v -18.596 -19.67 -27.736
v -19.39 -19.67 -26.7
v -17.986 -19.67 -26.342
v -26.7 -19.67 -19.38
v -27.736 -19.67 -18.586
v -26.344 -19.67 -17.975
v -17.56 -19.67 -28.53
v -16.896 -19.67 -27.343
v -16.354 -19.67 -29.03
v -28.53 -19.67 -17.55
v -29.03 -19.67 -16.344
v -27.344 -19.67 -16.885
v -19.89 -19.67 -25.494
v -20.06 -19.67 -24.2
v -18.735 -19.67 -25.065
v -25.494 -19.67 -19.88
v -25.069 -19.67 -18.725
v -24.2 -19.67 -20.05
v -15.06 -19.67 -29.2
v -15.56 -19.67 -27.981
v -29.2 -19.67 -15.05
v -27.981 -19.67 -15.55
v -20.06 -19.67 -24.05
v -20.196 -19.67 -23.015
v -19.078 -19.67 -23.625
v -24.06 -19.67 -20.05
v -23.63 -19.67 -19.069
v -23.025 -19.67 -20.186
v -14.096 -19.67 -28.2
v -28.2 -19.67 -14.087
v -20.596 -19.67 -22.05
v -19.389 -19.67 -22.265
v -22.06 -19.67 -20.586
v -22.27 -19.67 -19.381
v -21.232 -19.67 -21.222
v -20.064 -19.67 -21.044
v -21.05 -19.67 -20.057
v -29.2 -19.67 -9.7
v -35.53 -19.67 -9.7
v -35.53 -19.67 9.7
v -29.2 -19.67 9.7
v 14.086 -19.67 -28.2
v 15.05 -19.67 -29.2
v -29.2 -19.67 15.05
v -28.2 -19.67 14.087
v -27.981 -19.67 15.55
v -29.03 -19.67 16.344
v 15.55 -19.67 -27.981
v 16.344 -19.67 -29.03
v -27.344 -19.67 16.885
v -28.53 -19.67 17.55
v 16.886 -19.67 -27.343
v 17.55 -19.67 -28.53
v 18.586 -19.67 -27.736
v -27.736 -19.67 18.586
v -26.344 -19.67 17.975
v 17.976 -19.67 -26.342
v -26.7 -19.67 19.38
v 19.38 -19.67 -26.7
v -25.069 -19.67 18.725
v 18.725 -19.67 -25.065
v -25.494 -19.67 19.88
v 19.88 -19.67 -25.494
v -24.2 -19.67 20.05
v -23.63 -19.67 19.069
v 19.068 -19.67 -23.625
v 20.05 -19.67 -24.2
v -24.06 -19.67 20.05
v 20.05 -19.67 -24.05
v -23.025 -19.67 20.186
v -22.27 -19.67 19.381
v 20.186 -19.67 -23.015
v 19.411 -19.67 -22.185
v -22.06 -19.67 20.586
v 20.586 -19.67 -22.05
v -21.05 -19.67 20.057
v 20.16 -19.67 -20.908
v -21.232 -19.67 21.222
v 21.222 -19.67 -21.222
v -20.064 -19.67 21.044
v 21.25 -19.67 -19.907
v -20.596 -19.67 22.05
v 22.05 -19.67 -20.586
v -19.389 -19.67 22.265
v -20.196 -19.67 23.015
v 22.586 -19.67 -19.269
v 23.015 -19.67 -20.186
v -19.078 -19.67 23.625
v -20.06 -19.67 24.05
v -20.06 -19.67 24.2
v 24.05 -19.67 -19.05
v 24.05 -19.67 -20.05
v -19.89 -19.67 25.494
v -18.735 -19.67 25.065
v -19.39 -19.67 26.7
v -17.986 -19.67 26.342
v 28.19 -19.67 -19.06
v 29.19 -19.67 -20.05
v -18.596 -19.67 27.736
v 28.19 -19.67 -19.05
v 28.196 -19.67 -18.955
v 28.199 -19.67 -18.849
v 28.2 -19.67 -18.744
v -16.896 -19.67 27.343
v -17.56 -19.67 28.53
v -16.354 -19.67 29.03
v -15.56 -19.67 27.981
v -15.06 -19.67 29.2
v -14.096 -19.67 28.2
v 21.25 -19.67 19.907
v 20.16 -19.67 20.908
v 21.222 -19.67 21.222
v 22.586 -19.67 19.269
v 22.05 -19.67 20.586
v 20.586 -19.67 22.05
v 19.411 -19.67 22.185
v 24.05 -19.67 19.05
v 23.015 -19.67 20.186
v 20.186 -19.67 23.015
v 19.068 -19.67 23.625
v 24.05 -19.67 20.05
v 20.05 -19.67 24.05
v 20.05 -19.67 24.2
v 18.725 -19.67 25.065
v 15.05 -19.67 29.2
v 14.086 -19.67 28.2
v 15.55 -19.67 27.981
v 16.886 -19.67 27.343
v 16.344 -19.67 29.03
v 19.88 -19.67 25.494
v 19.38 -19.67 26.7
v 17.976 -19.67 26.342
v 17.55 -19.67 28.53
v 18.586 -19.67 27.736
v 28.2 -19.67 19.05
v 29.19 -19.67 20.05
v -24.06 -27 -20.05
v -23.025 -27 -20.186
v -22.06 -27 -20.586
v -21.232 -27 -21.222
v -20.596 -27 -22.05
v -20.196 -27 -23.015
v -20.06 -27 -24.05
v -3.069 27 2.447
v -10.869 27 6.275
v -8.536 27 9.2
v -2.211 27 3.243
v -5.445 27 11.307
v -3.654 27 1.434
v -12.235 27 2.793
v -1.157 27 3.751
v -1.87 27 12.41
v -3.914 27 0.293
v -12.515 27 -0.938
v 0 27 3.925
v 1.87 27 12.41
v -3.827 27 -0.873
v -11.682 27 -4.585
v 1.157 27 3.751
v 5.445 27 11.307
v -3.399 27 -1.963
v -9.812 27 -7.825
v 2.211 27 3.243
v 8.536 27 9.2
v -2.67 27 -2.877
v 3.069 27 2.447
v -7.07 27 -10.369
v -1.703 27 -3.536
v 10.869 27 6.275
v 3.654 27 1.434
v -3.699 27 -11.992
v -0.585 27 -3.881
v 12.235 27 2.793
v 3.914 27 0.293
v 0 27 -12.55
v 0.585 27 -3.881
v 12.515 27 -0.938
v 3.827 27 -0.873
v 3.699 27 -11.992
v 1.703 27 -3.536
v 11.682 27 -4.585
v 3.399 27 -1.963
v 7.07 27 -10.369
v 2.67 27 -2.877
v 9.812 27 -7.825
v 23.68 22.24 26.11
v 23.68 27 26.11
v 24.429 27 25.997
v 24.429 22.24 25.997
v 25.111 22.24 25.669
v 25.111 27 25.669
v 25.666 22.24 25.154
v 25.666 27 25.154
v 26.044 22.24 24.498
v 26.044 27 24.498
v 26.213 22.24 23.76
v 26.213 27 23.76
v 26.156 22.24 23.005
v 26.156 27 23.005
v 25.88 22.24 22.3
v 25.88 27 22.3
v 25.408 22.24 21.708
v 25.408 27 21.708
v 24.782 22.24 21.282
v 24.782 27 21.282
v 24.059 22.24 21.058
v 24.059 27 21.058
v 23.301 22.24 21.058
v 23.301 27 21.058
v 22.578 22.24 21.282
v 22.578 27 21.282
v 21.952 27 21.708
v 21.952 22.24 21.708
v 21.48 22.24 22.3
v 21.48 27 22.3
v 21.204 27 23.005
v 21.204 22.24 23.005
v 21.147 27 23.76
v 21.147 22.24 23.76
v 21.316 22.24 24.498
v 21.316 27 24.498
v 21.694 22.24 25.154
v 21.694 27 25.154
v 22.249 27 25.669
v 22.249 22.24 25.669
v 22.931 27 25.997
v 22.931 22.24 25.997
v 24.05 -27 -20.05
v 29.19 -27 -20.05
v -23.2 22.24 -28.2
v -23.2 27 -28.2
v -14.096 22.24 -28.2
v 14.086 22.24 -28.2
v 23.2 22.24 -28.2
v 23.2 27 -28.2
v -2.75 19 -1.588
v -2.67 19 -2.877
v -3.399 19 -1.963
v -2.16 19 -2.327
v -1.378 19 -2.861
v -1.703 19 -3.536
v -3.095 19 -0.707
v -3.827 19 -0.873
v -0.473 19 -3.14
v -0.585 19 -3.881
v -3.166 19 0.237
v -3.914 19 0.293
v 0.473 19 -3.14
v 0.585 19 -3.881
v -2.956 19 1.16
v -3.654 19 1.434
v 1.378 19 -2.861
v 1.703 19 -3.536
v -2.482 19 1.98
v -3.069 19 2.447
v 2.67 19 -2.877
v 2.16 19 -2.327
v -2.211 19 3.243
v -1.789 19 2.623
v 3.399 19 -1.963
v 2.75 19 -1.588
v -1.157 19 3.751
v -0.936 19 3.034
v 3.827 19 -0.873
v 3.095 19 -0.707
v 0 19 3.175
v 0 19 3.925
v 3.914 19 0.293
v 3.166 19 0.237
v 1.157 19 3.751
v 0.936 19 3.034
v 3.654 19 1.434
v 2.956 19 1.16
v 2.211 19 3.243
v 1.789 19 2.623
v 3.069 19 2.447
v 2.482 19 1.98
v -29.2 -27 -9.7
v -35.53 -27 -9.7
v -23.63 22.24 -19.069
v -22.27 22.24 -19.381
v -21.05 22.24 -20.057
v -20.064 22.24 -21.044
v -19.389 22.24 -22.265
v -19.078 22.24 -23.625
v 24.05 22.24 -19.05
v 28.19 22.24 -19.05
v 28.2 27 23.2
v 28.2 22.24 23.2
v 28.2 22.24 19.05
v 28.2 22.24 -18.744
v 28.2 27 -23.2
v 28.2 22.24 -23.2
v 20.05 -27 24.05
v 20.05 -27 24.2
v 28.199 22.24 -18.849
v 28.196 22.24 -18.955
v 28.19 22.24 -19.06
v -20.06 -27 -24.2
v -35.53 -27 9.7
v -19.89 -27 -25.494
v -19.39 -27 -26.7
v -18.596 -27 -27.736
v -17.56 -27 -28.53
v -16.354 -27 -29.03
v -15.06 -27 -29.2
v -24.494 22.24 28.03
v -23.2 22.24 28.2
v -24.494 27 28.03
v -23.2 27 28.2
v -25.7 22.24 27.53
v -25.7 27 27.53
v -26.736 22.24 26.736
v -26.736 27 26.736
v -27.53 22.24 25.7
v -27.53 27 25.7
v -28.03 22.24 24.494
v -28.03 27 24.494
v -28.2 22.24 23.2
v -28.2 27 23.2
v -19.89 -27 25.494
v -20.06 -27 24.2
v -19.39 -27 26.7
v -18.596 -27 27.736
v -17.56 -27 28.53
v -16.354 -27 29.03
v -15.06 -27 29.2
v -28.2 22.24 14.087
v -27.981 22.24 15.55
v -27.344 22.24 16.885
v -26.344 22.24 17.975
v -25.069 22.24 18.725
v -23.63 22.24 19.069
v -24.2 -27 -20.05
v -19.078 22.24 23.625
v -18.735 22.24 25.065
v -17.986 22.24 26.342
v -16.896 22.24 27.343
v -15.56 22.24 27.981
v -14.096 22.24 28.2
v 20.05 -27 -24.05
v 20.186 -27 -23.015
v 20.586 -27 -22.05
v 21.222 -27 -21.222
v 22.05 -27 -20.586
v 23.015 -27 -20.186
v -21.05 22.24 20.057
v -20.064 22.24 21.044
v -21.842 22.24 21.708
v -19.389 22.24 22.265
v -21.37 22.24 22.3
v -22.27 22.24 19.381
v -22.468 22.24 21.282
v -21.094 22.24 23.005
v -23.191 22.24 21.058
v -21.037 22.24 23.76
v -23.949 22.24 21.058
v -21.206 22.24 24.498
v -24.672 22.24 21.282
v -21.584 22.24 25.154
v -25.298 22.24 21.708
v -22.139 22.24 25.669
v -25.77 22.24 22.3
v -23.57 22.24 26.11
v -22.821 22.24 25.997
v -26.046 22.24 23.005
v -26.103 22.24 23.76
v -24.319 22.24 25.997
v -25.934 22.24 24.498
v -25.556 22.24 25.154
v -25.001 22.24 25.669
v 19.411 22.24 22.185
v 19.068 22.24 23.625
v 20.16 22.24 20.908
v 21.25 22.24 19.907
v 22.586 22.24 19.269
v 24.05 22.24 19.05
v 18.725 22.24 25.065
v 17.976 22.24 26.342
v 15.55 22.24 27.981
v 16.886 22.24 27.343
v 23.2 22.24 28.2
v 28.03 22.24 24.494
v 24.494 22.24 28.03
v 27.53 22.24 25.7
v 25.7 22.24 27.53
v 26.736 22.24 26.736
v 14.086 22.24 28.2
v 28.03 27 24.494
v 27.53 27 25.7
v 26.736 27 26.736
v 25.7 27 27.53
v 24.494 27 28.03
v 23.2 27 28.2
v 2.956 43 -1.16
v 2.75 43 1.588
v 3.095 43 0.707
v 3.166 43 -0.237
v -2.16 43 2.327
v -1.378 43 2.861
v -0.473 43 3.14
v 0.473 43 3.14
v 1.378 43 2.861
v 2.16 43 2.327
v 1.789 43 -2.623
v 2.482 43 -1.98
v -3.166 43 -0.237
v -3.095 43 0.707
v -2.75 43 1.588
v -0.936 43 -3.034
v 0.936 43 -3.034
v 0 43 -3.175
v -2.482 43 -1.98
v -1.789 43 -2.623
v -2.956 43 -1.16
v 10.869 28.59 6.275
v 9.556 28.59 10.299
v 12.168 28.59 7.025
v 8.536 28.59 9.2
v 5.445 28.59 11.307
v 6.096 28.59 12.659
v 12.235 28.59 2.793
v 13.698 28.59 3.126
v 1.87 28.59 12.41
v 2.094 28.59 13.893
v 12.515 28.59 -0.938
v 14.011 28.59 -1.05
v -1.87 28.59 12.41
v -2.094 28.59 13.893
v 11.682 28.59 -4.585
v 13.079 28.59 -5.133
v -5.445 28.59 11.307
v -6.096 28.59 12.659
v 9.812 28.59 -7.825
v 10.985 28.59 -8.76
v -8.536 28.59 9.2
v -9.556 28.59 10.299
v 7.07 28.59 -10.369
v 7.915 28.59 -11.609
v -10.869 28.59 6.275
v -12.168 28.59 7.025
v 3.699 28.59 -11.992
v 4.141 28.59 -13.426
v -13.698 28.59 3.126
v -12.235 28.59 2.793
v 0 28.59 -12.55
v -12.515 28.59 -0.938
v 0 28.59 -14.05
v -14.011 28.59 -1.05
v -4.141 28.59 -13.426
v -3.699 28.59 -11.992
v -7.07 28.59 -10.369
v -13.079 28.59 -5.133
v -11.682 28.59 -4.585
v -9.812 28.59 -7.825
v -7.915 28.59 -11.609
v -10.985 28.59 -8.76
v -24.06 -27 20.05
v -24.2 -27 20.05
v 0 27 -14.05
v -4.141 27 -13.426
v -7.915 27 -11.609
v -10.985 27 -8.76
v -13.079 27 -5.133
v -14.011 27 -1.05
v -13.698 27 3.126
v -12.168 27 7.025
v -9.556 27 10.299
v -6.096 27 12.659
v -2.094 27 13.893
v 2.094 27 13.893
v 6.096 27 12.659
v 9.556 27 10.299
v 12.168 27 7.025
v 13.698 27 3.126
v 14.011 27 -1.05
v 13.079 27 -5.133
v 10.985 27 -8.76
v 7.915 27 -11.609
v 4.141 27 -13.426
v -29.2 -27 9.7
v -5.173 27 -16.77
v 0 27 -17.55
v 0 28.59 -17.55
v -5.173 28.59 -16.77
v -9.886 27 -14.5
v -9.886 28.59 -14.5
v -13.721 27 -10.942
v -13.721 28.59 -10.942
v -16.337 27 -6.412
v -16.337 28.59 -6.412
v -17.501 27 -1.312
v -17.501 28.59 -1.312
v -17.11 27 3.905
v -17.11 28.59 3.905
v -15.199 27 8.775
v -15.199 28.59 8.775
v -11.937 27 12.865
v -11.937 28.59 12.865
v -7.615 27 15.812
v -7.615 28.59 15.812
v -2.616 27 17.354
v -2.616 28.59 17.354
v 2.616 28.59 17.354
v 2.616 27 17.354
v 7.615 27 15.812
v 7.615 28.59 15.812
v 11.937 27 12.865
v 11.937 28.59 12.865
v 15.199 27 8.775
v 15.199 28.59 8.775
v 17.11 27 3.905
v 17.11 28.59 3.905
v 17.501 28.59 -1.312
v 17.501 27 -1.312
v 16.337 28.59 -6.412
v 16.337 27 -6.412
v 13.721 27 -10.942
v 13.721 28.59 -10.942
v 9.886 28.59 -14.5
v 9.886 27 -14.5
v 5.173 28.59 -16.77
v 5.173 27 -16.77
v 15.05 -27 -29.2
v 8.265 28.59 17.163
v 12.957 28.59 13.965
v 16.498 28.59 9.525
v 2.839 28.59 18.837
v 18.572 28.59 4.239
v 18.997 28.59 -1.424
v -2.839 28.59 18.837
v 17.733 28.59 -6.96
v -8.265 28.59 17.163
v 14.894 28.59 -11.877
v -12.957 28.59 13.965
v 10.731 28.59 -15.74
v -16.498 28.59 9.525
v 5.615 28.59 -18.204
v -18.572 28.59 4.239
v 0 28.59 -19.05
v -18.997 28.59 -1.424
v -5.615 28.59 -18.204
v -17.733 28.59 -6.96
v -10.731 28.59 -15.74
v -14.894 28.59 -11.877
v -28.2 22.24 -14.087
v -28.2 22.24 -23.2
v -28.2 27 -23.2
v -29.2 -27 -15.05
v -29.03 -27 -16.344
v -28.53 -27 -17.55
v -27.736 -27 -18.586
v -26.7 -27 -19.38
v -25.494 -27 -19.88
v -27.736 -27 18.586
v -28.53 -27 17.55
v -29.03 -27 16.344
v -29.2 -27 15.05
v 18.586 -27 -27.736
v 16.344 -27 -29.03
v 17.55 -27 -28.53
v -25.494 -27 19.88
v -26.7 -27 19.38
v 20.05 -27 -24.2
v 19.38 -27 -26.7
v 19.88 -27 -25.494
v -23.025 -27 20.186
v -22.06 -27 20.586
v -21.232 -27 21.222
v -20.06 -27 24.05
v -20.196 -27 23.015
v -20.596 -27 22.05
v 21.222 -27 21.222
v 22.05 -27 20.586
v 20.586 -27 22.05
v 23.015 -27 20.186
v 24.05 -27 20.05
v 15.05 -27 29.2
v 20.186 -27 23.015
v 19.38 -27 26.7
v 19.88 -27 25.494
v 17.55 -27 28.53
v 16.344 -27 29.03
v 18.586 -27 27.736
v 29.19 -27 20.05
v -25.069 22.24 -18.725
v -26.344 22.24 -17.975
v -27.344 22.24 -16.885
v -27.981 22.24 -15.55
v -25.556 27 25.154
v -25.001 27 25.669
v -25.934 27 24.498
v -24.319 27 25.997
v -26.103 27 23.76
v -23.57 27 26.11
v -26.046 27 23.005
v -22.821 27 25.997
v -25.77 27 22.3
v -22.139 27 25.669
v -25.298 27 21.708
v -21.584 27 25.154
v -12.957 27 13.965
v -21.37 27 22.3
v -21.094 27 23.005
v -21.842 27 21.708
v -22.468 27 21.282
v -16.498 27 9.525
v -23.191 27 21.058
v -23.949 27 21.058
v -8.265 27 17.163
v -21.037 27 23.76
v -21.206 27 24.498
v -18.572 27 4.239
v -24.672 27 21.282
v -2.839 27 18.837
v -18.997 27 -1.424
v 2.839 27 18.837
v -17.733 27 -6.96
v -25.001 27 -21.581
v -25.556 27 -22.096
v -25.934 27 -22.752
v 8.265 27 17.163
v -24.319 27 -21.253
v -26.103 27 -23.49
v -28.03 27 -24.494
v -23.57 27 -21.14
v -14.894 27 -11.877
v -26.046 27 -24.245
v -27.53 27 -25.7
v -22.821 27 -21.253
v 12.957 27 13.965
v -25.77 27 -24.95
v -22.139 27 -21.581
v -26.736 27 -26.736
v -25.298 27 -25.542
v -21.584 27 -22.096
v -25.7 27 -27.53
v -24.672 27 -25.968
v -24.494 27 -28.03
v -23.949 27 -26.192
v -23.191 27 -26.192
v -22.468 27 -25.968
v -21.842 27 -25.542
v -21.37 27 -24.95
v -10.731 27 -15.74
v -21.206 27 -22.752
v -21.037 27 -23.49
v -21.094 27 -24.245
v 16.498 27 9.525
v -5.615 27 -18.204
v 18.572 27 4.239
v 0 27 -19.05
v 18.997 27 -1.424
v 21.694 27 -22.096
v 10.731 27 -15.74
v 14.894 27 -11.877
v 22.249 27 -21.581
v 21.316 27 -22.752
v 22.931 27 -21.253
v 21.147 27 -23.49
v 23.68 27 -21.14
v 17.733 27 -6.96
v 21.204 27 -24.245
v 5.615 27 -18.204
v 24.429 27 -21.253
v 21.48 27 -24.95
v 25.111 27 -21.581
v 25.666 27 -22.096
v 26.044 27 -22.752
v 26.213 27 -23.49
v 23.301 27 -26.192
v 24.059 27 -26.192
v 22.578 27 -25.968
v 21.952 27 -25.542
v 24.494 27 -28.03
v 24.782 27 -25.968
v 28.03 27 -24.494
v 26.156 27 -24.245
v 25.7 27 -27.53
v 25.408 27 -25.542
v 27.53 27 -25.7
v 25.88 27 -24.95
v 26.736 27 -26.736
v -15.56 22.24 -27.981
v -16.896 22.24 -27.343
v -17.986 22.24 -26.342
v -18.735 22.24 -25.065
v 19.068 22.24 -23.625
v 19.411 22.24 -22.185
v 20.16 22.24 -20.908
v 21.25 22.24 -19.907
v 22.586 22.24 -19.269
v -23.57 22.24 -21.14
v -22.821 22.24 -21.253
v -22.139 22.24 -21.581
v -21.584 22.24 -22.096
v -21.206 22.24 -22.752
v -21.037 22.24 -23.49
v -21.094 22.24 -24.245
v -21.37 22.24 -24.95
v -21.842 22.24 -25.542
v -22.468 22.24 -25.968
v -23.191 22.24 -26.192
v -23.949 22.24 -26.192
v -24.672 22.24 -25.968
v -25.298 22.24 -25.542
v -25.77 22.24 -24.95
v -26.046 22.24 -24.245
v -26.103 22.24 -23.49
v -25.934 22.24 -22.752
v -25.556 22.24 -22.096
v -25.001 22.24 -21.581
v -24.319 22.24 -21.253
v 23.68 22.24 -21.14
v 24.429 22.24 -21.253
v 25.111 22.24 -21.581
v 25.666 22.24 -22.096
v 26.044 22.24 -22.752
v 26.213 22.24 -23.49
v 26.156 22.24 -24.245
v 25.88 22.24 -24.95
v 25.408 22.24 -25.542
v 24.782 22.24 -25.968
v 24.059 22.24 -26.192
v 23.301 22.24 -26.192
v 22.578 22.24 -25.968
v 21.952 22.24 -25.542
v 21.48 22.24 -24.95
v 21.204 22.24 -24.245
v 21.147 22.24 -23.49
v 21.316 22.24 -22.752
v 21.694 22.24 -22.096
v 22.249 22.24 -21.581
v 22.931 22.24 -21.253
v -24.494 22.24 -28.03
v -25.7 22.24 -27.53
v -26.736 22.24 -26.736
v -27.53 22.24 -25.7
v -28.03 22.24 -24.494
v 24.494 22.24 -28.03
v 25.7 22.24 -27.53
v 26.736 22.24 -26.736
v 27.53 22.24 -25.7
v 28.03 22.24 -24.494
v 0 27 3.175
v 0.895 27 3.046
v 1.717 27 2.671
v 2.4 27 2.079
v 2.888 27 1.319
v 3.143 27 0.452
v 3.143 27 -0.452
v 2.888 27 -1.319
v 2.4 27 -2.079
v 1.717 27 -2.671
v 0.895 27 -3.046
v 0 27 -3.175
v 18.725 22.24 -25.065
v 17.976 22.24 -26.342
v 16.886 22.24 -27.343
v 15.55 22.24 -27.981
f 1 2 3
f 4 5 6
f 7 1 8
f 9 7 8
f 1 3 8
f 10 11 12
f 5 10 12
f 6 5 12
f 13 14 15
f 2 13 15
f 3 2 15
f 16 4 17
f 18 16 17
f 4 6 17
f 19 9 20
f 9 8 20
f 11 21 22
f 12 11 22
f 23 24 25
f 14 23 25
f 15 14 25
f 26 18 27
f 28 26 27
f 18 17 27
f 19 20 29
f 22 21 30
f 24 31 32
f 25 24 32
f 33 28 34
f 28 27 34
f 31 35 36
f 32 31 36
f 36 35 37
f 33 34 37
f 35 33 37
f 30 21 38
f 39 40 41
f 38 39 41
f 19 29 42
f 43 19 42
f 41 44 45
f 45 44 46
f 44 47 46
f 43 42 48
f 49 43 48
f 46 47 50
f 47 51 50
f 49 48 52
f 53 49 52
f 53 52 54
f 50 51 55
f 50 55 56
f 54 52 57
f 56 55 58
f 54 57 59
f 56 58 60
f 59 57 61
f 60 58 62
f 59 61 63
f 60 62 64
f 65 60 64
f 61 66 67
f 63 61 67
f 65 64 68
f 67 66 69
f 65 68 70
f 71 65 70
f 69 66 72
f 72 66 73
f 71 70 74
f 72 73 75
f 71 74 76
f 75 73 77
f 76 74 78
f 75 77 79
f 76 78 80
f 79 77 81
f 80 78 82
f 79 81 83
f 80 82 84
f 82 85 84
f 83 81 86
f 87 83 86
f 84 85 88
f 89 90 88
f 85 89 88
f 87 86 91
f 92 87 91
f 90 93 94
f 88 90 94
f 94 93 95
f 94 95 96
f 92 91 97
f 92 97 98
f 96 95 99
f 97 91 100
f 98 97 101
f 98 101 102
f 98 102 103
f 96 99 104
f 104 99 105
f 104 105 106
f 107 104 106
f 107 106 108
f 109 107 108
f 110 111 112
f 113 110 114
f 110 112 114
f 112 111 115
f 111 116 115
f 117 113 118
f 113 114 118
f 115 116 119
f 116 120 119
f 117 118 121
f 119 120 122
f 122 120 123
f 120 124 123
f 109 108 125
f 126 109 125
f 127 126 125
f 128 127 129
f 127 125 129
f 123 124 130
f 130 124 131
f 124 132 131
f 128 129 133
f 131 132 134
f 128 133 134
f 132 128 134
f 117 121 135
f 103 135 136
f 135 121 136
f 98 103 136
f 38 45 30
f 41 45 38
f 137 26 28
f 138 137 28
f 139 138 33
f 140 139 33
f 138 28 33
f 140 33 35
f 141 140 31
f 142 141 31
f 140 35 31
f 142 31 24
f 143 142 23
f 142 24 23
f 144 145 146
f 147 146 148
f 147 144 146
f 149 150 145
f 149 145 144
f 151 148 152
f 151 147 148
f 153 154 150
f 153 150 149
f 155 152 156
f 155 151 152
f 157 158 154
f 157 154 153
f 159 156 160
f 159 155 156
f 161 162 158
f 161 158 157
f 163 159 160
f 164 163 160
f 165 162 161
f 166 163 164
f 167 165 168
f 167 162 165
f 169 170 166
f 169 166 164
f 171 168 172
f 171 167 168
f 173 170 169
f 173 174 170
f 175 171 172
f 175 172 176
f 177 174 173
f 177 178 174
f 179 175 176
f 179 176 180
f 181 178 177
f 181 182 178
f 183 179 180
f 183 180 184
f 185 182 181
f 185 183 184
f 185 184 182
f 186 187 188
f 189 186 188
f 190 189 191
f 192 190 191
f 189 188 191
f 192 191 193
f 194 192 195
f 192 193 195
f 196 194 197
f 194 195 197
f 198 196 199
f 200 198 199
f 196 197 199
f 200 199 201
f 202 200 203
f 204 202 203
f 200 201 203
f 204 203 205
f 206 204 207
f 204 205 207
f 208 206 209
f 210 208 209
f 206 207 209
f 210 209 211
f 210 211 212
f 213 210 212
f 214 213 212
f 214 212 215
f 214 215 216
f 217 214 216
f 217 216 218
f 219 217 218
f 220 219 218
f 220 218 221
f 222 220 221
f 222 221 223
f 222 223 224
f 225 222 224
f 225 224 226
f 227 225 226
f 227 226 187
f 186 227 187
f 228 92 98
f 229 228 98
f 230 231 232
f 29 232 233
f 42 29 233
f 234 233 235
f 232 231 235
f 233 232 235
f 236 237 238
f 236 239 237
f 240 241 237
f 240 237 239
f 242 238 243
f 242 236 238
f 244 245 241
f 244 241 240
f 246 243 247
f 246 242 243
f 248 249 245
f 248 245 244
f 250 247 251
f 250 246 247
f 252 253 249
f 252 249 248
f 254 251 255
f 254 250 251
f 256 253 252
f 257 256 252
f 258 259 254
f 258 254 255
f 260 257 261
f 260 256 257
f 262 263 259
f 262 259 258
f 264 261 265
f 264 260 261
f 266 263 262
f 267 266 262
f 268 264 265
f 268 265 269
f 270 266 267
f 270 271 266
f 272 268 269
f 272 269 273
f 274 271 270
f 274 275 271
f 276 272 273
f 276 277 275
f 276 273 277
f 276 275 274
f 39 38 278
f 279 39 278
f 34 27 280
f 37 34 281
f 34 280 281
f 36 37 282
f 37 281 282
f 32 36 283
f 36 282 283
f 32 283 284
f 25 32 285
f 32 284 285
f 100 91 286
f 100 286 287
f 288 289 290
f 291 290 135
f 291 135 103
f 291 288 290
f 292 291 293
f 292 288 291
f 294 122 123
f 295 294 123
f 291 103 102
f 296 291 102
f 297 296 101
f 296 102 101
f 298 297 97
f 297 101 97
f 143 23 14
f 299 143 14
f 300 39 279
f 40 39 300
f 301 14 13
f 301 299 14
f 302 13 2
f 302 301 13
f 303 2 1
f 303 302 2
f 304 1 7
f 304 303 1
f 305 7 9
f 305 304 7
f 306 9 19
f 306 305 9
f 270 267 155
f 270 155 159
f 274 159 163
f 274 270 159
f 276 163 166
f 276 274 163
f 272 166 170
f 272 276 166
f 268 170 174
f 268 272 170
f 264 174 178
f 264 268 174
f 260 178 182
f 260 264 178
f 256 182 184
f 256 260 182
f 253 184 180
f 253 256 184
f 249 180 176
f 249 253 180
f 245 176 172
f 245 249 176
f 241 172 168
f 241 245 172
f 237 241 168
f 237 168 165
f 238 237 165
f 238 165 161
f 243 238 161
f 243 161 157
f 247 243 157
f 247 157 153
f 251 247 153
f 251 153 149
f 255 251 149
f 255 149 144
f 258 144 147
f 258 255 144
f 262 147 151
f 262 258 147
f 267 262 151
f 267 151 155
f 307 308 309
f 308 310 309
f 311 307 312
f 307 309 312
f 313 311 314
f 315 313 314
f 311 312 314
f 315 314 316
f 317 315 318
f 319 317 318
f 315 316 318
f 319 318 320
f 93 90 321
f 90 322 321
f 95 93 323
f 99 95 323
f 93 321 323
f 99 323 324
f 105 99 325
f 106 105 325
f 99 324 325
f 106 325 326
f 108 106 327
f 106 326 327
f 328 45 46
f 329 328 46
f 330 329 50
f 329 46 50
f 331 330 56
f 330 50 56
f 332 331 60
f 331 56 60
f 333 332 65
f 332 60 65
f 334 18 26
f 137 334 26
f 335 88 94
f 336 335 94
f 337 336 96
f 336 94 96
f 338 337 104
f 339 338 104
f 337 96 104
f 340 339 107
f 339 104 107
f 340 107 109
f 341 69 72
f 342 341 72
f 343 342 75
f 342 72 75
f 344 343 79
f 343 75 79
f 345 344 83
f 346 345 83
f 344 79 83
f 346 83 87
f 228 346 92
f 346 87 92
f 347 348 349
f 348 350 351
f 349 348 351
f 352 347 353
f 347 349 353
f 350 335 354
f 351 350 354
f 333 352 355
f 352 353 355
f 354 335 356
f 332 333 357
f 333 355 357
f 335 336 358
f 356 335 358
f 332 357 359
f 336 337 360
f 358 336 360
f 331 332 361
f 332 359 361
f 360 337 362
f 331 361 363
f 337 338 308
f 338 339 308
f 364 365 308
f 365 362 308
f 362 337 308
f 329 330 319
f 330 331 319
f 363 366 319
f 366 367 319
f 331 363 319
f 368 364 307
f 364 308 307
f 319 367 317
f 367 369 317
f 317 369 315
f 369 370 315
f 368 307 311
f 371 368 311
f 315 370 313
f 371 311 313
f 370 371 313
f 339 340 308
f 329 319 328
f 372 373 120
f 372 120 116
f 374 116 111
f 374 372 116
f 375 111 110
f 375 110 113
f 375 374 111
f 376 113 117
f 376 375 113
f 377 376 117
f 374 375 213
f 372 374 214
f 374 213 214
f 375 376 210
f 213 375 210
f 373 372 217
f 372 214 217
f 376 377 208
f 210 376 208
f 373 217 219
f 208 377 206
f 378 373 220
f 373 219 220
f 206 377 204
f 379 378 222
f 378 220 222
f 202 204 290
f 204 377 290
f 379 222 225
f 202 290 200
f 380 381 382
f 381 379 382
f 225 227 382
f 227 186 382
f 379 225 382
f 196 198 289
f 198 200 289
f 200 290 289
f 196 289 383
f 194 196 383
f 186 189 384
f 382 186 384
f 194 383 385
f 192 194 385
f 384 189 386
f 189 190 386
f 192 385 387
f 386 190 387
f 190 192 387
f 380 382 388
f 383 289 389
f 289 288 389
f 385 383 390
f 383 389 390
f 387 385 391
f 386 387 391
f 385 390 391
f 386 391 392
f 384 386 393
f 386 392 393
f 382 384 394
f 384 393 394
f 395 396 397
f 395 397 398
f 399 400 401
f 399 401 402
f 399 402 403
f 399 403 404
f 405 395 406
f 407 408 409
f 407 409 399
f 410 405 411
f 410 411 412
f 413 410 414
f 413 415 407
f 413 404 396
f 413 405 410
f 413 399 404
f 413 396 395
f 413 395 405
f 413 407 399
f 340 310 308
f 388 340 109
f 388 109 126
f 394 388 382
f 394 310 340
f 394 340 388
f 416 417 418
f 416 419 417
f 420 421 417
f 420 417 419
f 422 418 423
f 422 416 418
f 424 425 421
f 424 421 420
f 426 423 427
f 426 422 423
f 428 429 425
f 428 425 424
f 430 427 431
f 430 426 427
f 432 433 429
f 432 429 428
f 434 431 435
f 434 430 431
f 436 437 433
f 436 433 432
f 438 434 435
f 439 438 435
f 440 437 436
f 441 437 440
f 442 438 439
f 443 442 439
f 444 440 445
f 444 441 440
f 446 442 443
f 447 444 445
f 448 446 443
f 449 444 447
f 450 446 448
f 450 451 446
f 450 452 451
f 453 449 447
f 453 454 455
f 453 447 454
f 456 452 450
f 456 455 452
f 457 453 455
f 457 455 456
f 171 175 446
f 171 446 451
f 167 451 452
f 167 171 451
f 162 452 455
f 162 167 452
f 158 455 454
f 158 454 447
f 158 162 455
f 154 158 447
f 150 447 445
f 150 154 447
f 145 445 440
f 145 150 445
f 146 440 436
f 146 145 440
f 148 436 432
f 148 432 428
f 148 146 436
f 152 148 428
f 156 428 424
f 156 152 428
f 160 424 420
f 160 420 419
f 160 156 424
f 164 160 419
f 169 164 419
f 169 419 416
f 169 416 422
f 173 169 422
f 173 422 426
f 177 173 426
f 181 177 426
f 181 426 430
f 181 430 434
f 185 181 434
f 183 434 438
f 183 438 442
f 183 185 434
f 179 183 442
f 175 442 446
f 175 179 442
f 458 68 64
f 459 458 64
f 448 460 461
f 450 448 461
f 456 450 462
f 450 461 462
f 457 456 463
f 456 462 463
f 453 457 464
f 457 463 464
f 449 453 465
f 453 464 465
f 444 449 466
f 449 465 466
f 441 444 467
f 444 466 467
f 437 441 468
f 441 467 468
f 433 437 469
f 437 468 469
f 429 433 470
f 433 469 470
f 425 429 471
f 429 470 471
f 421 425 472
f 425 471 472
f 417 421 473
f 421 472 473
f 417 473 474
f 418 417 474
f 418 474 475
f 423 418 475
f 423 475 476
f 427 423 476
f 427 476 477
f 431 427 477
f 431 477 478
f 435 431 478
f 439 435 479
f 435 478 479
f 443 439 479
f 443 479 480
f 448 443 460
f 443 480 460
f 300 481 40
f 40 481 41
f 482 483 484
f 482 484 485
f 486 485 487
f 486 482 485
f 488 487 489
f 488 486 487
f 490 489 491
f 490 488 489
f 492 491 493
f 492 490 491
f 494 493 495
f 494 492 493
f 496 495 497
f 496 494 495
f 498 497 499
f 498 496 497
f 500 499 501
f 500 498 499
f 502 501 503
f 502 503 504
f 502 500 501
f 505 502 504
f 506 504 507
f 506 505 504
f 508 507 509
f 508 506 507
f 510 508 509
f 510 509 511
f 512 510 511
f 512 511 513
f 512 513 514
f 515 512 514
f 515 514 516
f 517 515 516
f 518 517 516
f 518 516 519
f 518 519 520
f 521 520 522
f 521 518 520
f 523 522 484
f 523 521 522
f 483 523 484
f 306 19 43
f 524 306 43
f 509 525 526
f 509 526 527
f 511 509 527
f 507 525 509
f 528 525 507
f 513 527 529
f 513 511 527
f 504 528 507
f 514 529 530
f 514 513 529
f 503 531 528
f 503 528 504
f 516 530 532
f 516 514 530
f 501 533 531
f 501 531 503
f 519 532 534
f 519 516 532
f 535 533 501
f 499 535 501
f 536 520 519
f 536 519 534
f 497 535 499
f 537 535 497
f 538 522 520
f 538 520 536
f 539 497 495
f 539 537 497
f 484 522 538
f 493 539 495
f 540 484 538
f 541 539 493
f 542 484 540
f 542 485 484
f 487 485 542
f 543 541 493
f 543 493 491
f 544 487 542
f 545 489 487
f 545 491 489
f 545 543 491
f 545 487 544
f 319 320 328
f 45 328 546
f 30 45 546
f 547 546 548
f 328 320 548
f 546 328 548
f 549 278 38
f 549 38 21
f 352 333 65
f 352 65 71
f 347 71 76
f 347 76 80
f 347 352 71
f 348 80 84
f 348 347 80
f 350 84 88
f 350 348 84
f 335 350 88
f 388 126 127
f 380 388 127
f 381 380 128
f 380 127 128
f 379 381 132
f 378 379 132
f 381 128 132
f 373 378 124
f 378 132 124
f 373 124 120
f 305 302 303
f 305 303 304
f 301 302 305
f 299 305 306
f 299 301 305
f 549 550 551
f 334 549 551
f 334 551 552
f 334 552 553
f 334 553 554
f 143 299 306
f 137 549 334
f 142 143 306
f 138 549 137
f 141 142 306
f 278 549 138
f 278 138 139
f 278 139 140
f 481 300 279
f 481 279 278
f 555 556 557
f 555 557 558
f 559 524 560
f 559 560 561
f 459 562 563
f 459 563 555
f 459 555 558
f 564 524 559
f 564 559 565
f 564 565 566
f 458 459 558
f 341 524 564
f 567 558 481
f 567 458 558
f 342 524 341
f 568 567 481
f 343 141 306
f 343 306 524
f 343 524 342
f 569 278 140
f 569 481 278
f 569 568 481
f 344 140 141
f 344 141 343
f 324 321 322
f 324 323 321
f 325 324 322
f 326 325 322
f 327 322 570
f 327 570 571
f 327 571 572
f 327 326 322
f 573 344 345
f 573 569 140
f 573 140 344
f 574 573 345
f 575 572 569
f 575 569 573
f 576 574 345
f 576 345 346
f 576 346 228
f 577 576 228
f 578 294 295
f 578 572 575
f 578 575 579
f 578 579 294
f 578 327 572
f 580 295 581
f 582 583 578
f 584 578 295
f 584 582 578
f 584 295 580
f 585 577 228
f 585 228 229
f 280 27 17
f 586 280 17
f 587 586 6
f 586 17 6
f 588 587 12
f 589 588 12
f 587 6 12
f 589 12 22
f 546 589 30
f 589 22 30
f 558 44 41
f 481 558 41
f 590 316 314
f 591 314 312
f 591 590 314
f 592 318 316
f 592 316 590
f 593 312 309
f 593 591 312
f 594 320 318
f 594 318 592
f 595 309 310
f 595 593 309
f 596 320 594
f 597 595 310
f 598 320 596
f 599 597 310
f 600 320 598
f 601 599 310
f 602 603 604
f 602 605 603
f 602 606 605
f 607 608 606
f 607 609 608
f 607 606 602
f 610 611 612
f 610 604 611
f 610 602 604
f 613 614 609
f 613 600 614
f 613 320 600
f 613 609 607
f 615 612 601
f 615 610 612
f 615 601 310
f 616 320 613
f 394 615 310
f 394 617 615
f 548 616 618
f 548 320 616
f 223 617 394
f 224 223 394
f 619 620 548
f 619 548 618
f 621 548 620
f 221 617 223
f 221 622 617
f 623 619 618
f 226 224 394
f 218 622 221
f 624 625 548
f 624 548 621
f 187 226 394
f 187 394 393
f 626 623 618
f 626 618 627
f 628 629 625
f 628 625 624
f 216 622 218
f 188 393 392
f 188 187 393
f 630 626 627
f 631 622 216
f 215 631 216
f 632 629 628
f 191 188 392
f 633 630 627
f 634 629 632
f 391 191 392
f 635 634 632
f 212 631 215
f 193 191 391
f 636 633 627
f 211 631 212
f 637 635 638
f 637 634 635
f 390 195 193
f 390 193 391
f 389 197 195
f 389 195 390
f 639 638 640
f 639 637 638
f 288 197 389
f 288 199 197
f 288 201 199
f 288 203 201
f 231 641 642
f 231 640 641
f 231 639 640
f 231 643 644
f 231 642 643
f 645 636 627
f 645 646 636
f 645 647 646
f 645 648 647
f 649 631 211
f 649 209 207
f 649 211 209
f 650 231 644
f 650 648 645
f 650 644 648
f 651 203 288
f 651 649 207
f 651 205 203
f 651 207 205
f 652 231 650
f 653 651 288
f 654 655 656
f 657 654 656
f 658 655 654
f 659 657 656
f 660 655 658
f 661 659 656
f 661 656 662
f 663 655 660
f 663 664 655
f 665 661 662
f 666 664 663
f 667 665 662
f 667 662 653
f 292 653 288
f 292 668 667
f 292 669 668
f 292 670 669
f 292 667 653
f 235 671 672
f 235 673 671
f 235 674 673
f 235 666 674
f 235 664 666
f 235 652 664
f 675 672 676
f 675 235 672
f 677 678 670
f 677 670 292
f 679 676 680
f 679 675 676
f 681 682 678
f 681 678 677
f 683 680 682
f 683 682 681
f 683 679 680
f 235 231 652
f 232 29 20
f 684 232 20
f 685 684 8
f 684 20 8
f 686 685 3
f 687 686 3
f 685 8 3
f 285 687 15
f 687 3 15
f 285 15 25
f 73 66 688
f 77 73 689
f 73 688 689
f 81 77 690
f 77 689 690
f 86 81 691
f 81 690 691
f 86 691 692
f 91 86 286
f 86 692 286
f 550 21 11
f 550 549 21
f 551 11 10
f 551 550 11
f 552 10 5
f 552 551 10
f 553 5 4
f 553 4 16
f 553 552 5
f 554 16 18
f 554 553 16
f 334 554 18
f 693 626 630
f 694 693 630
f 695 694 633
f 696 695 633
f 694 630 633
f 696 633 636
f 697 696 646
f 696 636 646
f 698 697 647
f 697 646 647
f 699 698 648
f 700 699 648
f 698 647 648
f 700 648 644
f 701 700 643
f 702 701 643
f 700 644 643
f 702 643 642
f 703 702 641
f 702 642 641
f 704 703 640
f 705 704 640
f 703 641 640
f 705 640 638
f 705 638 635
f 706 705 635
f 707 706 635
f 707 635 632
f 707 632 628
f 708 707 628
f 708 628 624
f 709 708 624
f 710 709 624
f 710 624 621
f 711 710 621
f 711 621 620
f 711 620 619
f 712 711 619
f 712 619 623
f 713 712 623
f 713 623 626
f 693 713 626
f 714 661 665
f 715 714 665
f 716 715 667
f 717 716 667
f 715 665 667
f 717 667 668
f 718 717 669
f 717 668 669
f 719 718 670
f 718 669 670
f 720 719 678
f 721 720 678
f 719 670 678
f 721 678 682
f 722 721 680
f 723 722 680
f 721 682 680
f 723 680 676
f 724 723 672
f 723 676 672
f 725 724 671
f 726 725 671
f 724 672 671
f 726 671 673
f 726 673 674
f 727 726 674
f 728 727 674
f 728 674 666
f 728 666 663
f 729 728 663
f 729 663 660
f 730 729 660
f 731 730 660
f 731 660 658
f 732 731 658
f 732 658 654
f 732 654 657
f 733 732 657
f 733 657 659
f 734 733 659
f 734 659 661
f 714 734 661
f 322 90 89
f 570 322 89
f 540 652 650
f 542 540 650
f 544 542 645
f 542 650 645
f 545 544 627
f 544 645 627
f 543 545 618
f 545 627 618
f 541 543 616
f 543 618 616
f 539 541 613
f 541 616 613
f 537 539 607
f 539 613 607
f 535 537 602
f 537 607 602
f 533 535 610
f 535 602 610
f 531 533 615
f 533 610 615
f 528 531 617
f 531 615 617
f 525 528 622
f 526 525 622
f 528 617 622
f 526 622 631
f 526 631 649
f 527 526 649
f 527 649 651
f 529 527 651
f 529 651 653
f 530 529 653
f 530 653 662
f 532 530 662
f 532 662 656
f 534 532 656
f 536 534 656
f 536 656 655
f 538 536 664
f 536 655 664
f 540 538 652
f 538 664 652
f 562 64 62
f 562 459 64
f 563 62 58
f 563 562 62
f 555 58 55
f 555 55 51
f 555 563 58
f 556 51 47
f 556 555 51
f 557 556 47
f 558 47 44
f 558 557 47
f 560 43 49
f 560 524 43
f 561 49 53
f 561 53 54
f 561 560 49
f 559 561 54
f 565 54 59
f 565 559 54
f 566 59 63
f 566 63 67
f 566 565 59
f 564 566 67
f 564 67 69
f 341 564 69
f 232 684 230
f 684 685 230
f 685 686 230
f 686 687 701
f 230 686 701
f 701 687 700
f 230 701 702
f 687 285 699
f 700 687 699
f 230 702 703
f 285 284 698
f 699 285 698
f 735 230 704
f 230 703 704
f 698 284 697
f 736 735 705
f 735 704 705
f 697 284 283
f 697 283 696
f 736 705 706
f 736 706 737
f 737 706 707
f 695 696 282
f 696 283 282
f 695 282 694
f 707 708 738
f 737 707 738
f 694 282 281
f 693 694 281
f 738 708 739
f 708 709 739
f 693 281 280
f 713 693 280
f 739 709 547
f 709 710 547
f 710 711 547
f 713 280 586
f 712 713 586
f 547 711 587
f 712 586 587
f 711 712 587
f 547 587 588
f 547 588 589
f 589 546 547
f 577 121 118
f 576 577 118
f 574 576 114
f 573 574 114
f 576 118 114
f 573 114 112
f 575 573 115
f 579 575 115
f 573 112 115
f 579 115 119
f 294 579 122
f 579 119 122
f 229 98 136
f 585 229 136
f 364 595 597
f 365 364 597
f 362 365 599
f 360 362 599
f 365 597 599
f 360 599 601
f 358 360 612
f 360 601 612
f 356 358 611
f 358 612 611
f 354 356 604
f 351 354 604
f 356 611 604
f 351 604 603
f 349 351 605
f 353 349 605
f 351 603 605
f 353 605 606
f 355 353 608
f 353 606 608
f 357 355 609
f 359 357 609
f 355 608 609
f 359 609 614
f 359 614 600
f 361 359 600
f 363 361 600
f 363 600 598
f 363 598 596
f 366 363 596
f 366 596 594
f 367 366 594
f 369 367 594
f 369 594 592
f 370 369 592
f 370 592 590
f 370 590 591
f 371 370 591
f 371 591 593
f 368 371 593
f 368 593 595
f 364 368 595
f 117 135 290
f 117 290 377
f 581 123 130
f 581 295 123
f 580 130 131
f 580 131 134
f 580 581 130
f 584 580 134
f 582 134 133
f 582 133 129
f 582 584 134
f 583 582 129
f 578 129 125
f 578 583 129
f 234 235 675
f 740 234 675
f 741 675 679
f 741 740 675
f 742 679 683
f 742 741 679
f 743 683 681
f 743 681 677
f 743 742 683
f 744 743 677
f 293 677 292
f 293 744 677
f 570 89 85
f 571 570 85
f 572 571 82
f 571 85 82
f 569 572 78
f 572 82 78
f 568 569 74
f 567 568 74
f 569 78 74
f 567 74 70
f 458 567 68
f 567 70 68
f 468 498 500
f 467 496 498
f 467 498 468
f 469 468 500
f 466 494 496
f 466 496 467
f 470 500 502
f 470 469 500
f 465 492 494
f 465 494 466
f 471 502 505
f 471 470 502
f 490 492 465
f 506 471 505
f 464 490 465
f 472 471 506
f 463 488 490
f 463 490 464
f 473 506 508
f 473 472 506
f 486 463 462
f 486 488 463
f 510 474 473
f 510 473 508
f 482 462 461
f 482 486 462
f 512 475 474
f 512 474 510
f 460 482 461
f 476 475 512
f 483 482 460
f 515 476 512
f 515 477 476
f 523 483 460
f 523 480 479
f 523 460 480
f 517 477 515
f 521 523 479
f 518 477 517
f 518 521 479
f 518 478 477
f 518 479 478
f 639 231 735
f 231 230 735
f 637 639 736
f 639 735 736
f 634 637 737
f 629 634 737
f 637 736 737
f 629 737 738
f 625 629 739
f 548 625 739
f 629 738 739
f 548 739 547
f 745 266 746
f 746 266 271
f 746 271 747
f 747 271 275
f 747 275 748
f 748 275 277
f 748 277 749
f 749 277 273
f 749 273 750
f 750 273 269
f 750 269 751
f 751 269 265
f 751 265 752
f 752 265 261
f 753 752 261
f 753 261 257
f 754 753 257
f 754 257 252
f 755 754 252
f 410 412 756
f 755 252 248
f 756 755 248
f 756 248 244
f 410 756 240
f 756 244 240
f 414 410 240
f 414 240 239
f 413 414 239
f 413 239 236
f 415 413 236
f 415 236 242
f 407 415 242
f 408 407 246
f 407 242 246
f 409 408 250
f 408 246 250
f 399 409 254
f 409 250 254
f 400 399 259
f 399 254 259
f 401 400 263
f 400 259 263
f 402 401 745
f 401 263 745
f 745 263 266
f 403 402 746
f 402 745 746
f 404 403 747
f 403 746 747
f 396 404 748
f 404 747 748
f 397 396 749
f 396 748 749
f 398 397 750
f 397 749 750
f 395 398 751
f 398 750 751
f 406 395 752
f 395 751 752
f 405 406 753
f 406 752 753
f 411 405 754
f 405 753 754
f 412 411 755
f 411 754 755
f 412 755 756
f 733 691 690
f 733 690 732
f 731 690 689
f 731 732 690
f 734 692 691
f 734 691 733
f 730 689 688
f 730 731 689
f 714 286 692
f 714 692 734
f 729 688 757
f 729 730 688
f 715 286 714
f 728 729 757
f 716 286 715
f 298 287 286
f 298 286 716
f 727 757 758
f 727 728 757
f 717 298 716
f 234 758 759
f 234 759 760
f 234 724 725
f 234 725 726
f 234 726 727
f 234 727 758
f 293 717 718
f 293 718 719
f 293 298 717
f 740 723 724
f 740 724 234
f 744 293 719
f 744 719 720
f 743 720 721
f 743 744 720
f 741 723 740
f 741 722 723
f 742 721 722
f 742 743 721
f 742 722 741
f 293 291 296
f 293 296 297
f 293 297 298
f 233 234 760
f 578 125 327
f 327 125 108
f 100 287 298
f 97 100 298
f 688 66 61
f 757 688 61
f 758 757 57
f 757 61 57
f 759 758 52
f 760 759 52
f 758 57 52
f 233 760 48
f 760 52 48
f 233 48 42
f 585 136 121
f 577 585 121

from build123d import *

# Parameters (mm, degrees)
SKETCH1_W            = 56.4
SKETCH1_H            = 56.4
BOSS_EXTRUDE1_DEPTH  = 27
SKETCH2_R            = 19.05
SKETCH2_R_2          = 17.55
SKETCH2_R_3          = 14.05
SKETCH2_R_4          = 12.55
BOSS_EXTRUDE2_DEPTH  = 1.59
CUT_EXTRUDE1_DEPTH   = 49.24
LPATTERN2_COUNT      = 2
LPATTERN2_PITCH      = 47.25
LPATTERN2_COUNT_DIR2 = 2
LPATTERN2_PITCH_DIR2 = 47.25
SKETCH5_R            = 2.5400000000000027
CUT_EXTRUDE3_DEPTH   = 11.24
LPATTERN3_COUNT      = 2
LPATTERN3_PITCH      = 47.25
LPATTERN3_COUNT_DIR2 = 2
LPATTERN3_PITCH_DIR2 = 47.25
SKETCH6_R            = 3.175
BOSS_EXTRUDE3_DEPTH  = 16
CUT_EXTRUDE4_START   = -8
SKETCH8_R            = 3.925
SKETCH8_R_2          = 3.175
CUT_EXTRUDE4_DEPTH   = 8
FILLET2_R            = 5
BOSS_EXTRUDE5_DEPTH  = 7.33
CUT_EXTRUDE7_DEPTH   = 1
BOSS_EXTRUDE6_START  = -7.33
SKETCH19_W           = 1
SKETCH19_H           = 19.399999999999995
BOSS_EXTRUDE6_DEPTH  = 7.33
FILLET3_R            = 5
FILLET4_R            = 5
FILLET5_R            = 5
FILLET6_R            = 5
FILLET7_R            = 5
FILLET8_R            = 5
FILLET10_R           = 5
FILLET11_R           = 5
FILLET12_R           = 5
FILLET13_R           = 5
FILLET14_R           = 5
FILLET15_R           = 5


with BuildPart() as part:
    # Sketch1 → Boss-Extrude1 (new, symmetric)
    with BuildSketch(Plane(origin=(0, 0, 0), x_dir=(1, 0, 0), z_dir=(0, 1, 0))):
        Rectangle(SKETCH1_W, SKETCH1_H)
    extrude(amount=BOSS_EXTRUDE1_DEPTH, both=True)

    # Sketch2 → Boss-Extrude2 (add)
    # profile 1 of 2: a face of its own
    with BuildSketch(Plane(origin=(0, 27, 0), x_dir=(1, 0, 0), z_dir=(0, 1, 0))):
        with Locations(Location((0, 0, 0), (0, 0, 90))):
            Circle(SKETCH2_R)
        with Locations(Location((0, 0, 0), (0, 0, 90))):
            Circle(SKETCH2_R_2, mode=Mode.SUBTRACT)
    # profile 2 of 2: a face of its own
    with BuildSketch(Plane(origin=(0, 27, 0), x_dir=(1, 0, 0), z_dir=(0, 1, 0))):
        with Locations(Location((0, 0, 0), (0, 0, 90))):
            Circle(SKETCH2_R_3)
        with Locations(Location((0, 0, 0), (0, 0, 90))):
            Circle(SKETCH2_R_4, mode=Mode.SUBTRACT)
    extrude(amount=BOSS_EXTRUDE2_DEPTH)

    # Sketch3 → Cut-Extrude1 (cut)
    with BuildSketch(Plane.XZ.offset(27)):
        Polygon((-28.200000000000006, 28.200000000000003), (-19.060000000000006, 28.200000000000003), (-19.060000000000013, 19.050000000000004), (-28.200000000000014, 19.050000000000004), align=None)
    cut_extrude1 = extrude(amount=-CUT_EXTRUDE1_DEPTH, mode=Mode.SUBTRACT)

    # LPattern2: Cut-Extrude1 2 × 2
    with Locations(*[(i * LPATTERN2_PITCH, 0, -j * LPATTERN2_PITCH_DIR2) for i in range(LPATTERN2_COUNT) for j in range(LPATTERN2_COUNT_DIR2) if (i, j) != (0, 0)]):
        add(cut_extrude1, mode=Mode.SUBTRACT)

    # Sketch5 → Cut-Extrude3 (cut)
    with BuildSketch(Plane(origin=(0, 27, 0), x_dir=(1, 0, 0), z_dir=(0, 1, 0))):
        with Locations(Location((-23.57, -23.57, 0), (0, 0, 270))):
            Circle(SKETCH5_R)
    cut_extrude3 = extrude(amount=-CUT_EXTRUDE3_DEPTH, mode=Mode.SUBTRACT)

    # LPattern3: Cut-Extrude3 2 × 2
    with Locations(*[(i * LPATTERN3_PITCH, 0, -j * LPATTERN3_PITCH_DIR2) for i in range(LPATTERN3_COUNT) for j in range(LPATTERN3_COUNT_DIR2) if (i, j) != (0, 0)]):
        add(cut_extrude3, mode=Mode.SUBTRACT)

    # Sketch6 → Boss-Extrude3 (add)
    with BuildSketch(Plane(origin=(0, 27, 0), x_dir=(1, 0, 0), z_dir=(0, 1, 0))):
        with Locations(Location((0, 0, 0), (0, 0, 90))):
            Circle(SKETCH6_R)
    extrude(amount=BOSS_EXTRUDE3_DEPTH)

    # Sketch8 → Cut-Extrude4 (cut)
    with BuildSketch(Plane(origin=(0, 27, 0), x_dir=(1, 0, 0), z_dir=(0, 1, 0)).offset(CUT_EXTRUDE4_START)):
        with Locations(Location((0, 0, 0), (0, 0, 270))):
            Circle(SKETCH8_R)
        with Locations(Location((0, 0, 0), (0, 0, 270))):
            Circle(SKETCH8_R_2, mode=Mode.SUBTRACT)
    extrude(amount=CUT_EXTRUDE4_DEPTH, mode=Mode.SUBTRACT)

    # Fillet2
    fillet2_edges = [part.edges().sort_by_distance(p)[0] for p in [
        (-19.060000000000013, -2.379999999999999, 19.050000000000004),
        (-19.060000000000006, -2.379999999999999, -19.049999999999997),
        (19.049999999999986, -2.379999999999999, 19.050000000000004),
        (19.049999999999994, -2.379999999999999, -19.049999999999997),
    ]]
    fillet(fillet2_edges, radius=FILLET2_R)

    # Sketch9 → Boss-Extrude5 (add)
    with BuildSketch(Plane.ZY.offset(28.200000000000006)):
        Polygon((-9.699999999999996, -27.000000000000014), (9.7, -27.00000000000001), (9.700000000000003, -19.67), (-9.699999999999996, -19.670000000000005), align=None)
    extrude(amount=BOSS_EXTRUDE5_DEPTH)

    # Sketch17 → Cut-Extrude7 (cut)
    with BuildSketch(Plane(origin=(28.199999999999992, 0, 0), x_dir=(0, 0, -1), z_dir=(1, 0, 0))):
        Polygon((-28.200000000000003, -27), (-19.060000000000002, -27), (-19.060000000000002, 22.24), (-28.200000000000017, 22.24), align=None)
        Polygon((28.199999999999996, -27), (19.059999999999988, -27), (19.05999999999999, 22.24), (28.19999999999999, 22.24), align=None)
    extrude(amount=-CUT_EXTRUDE7_DEPTH, mode=Mode.SUBTRACT)

    # Sketch19 → Boss-Extrude6 (add)
    with BuildSketch(Plane.XZ.offset(27).offset(BOSS_EXTRUDE6_START)):
        with BuildLine():
            Line((-28.200000000000006, 9.700000000000001), (-28.200000000000014, 19.050000000000004))
            Line((-28.200000000000014, 19.050000000000004), (-24.060000000000013, 19.050000000000004))
            ThreePointArc((-24.060000000000013, 19.050000000000004), (-20.524466094067275, 20.514466094067267), (-19.060000000000006, 24.05))
            Line((-19.06000000000001, 24.05), (-19.060000000000006, 28.200000000000003))
            Line((-19.060000000000006, 28.200000000000003), (19.049999999999994, 28.200000000000003))
            Line((19.049999999999994, 28.200000000000003), (19.04999999999999, 24.050000000000008))
            ThreePointArc((19.04999999999999, 24.050000000000008), (20.514466094067252, 20.51446609406727), (24.04999999999999, 19.050000000000004))
            Line((24.04999999999999, 19.050000000000004), (28.189999999999987, 19.050000000000004))
            Line((28.189999999999987, 19.050000000000004), (28.18999999999999, 19.060000000000002))
            Line((28.18999999999999, 19.060000000000002), (28.199999999999992, 19.060000000000002))
            Line((28.199999999999992, 19.060000000000002), (28.199999999999992, -19.059999999999988))
            Line((28.199999999999992, -19.059999999999988), (28.19, -19.059999999999988))
            Line((28.19, -19.059999999999988), (28.19, -19.049999999999997))
            Line((28.19, -19.049999999999997), (24.049999999999997, -19.049999999999997))
            ThreePointArc((24.049999999999997, -19.049999999999997), (20.51446609406726, -20.51446609406726), (19.049999999999997, -24.049999999999994))
            Line((19.049999999999997, -24.049999999999994), (19.049999999999994, -28.199999999999996))
            Line((19.049999999999994, -28.199999999999996), (-19.060000000000006, -28.199999999999996))
            Line((-19.060000000000006, -28.199999999999996), (-19.060000000000002, -24.05))
            ThreePointArc((-19.060000000000002, -24.05), (-20.524466094067265, -20.51446609406726), (-24.060000000000006, -19.049999999999997))
            Line((-24.060000000000006, -19.049999999999997), (-28.2, -19.049999999999997))
            Line((-28.2, -19.049999999999997), (-28.200000000000006, -9.699999999999994))
            Line((-28.200000000000006, -9.699999999999994), (-29.200000000000006, -9.699999999999994))
            Line((-29.200000000000006, -9.699999999999994), (-29.2, -20.049999999999997))
            Line((-29.2, -20.049999999999997), (-24.060000000000006, -20.049999999999997))
            ThreePointArc((-24.060000000000006, -20.049999999999997), (-21.231572875253814, -21.22157287525381), (-20.060000000000006, -24.05))
            Line((-20.060000000000006, -24.05), (-20.060000000000013, -29.199999999999996))
            Line((-20.060000000000016, -29.199999999999996), (20.049999999999997, -29.199999999999996))
            Line((20.049999999999997, -29.199999999999996), (20.049999999999997, -24.049999999999994))
            ThreePointArc((20.049999999999997, -24.049999999999994), (21.22157287525381, -21.221572875253806), (24.049999999999997, -20.049999999999997))
            Line((24.049999999999997, -20.049999999999997), (29.189999999999987, -20.049999999999997))
            Line((29.189999999999987, -20.049999999999997), (29.189999999999994, 20.050000000000004))
            Line((29.189999999999994, 20.050000000000004), (24.04999999999999, 20.050000000000004))
            ThreePointArc((24.04999999999999, 20.050000000000004), (21.2215728752538, 21.221572875253816), (20.04999999999999, 24.050000000000008))
            Line((20.04999999999999, 24.050000000000008), (20.049999999999986, 29.200000000000006))
            Line((20.049999999999986, 29.200000000000006), (-20.060000000000006, 29.200000000000003))
            Line((-20.060000000000006, 29.200000000000003), (-20.060000000000006, 24.05))
            ThreePointArc((-20.060000000000006, 24.05), (-21.23157287525382, 21.221572875253813), (-24.060000000000013, 20.050000000000004))
            Line((-24.060000000000013, 20.050000000000004), (-29.200000000000014, 20.050000000000004))
            Line((-29.200000000000014, 20.050000000000004), (-29.200000000000006, 9.700000000000001))
            Line((-29.200000000000006, 9.700000000000001), (-28.200000000000006, 9.700000000000001))
        make_face()
        with Locations((-28.700000000000006, 3.55e-15)):
            Rectangle(SKETCH19_W, SKETCH19_H)
    extrude(amount=BOSS_EXTRUDE6_DEPTH)

    # Fillet3
    fillet3_edges = [part.edges().sort_by_distance(p)[0] for p in [
        (28.199999999999992, 24.619999999999997, 28.200000000000003),
        (-28.200000000000006, 24.62, 28.200000000000003),
        (-28.200000000000006, 24.62, -28.199999999999996),
        (28.199999999999992, 24.619999999999997, -28.199999999999996),
    ]]
    fillet(fillet3_edges, radius=FILLET3_R)

    # Fillet4
    # the kernel refuses this fillet: 5 mm, written as the material it takes off along each edge
    with BuildSketch(Plane(origin=(28.189999999999987, 22.239999999999995, 19.060000000000002), x_dir=(-7.1e-16, 0, -1), z_dir=(0, -1, 0))) as fillet4_piece_1_section:
        with BuildLine():
            CenterArc((FILLET4_R, FILLET4_R), FILLET4_R, 180.00000000000003, 90)
            Line((-3.55e-15, FILLET4_R), (0, 0))
            Line((0, 0), (FILLET4_R, 0))
        make_face()
    fillet4_piece_1 = extrude(amount=41.91, mode=Mode.PRIVATE)
    fillet4_piece_1 = split(fillet4_piece_1, bisect_by=Plane(origin=(28.194999999999993, 1.2849999999999966, 19.050000000000004), z_dir=(0, 0, 1)), keep=Keep.TOP, mode=Mode.PRIVATE)
    add(fillet4_piece_1, mode=Mode.SUBTRACT)
    with BuildSketch(Plane(origin=(19.049999999999994, -19.67, 28.200000000000003), x_dir=(-1, 0, 0), z_dir=(0, 1, 0))) as fillet4_piece_2:
        with BuildLine():
            CenterArc((4.96380951243048, -5), FILLET4_R, 90, 85.12397513038704)
            Line((-0.01809524378475658, -4.574999999999999), (-0.5162857194062802, -4.532499999999999))
            ThreePointArc((-0.5162857194062802, -4.532499999999999), (-0.49999999999999645, -4.149999999999995), (-0.5, 0))
            Line((-0.5, 0), (0, 0.5))
            Line((0, 0.5), (4.96380951243048, 0.5))
            Line((4.96380951243048, 0.5), (4.96380951243048, 0))
        make_face()
    extrude(amount=41.910000000000004, mode=Mode.SUBTRACT)
    with BuildSketch(Plane(origin=(-19.060000000000006, -19.67, 28.200000000000003), x_dir=(1, 0, 0), z_dir=(0, 1, 0))) as fillet4_piece_3:
        with BuildLine():
            CenterArc((4.963809512430471, 5), FILLET4_R, 184.87602486961296, 85.12397513038707)
            Line((-0.01809524378476723, 4.574999999999999), (-0.5162857194062909, 4.532499999999999))
            ThreePointArc((-0.5162857194062909, 4.532499999999999), (-0.5000000000000036, 4.150000000000002), (-0.5, 0))
            Line((-0.5, 0), (0, -0.5))
            Line((0, -0.5), (4.963809512430471, -0.5))
            Line((4.963809512430471, -0.5), (4.963809512430471, 0))
        make_face()
    extrude(amount=41.910000000000004, mode=Mode.SUBTRACT)
    with BuildSketch(Plane(origin=(-28.200000000000014, -19.67, 19.050000000000004), x_dir=(1.43e-15, 0, -1), z_dir=(0, 1, 0))) as fillet4_piece_4:
        with BuildLine():
            CenterArc((4.962951369950581, -5), FILLET4_R, 90.00000000000009, 85.06646876992886)
            Line((-0.01852431502470665, -4.570000000000004), (-0.5166718835222361, -4.5270000000000055))
            ThreePointArc((-0.5166718835222361, -4.5270000000000055), (-0.49999999999999406, -4.1400000000000015), (-0.5, -7.2e-16))
            Line((-0.5, -7.2e-16), (-7.2e-16, 0.5))
            Line((-7.2e-16, 0.5), (4.962951369950573, 0.5))
            Line((4.962951369950573, 0.5), (4.962951369950574, 0))
        make_face()
    extrude(amount=41.910000000000004, mode=Mode.SUBTRACT)

    # Fillet5
    # the kernel refuses this fillet: 5 mm, written as the material it takes off along each edge
    with BuildSketch(Plane(origin=(19.049999999999986, -19.67, -28.199999999999996), x_dir=(0.003955213605638994, 0, 0.999992178112076), z_dir=(0, 1, 0))) as fillet5_piece_1:
        with BuildLine():
            CenterArc((4.980327963641015, -4.983546754096982), FILLET5_R, 94.64940723207758, 85.12397513038707)
            Line((-0.01963292691936526, -4.963770686068789), (-0.5196290159754032, -4.961793079265969))
            Line((-0.5196290159754032, -4.961793079265969), (-0.499996089056038, 0.0019776068028195))
            Line((-0.499996089056038, 0.0019776068028195), (0.0019776068028195, 0.499996089056038))
            ThreePointArc((0.0019776068028195, 0.499996089056038), (4.151945145967937, 0.4835819525926397), (4.534506567594776, 0.4983546754096982))
            Line((4.534506567594776, 0.4983546754096982), (4.575035785417161, 0))
        make_face()
    extrude(amount=41.910000000000004, mode=Mode.SUBTRACT)

    # Fillet6
    # the kernel refuses this fillet: 5 mm, written as the material it takes off along each edge
    with BuildSketch(Plane(origin=(28.199999999999992, -19.67, -19.059999999999988), x_dir=(-1, 0, 0), z_dir=(0, 1, -7e-17))) as fillet6_piece_1:
        with BuildLine():
            CenterArc((5, 0.3160696125855509), FILLET6_R, 180, 3.624307494007553)
            Line((0, 0.3160696125855509), (0, 0))
            Line((0, 0), (0.00999999999999801, 0))
        make_face()
    extrude(amount=41.91, mode=Mode.SUBTRACT)

    # Fillet7
    # the kernel refuses this fillet: 5 mm, written as the material it takes off along each edge
    with BuildSketch(Plane(origin=(-28.200000000000006, -19.67, -19.049999999999997), x_dir=(0.9999917848297434, 0, -0.004053427318230063), z_dir=(0, 1, 0))) as fillet7_piece_1:
        with BuildLine():
            CenterArc((4.979841961486708, -4.983177735051244), FILLET7_R, 94.70128631619599, 85.06646876992889)
            Line((-0.02011696266200852, -4.962910598460094), (-0.5201128550768802, -4.960883884800979))
            Line((-0.5201128550768802, -4.960883884800979), (-0.4999958924148717, 0.00202671365911503))
            Line((-0.4999958924148717, 0.00202671365911503), (0.00202671365911503, 0.4999958924148717))
            ThreePointArc((0.00202671365911503, 0.4999958924148717), (4.141992702854253, 0.48321470331739924), (4.5290571018514765, 0.49831777350512513))
            Line((4.5290571018514765, 0.49831777350512513), (4.570037543636496, 0))
        make_face()
    extrude(amount=41.910000000000004, mode=Mode.SUBTRACT)

    # Fillet8
    # the kernel refuses this fillet: 5 mm, written as the material it takes off along each edge
    with BuildSketch(Plane(origin=(-19.060000000000013, -19.67, -28.199999999999996), x_dir=(1, 0, 0), z_dir=(0, 1, 0))) as fillet8_piece_1:
        with BuildLine():
            CenterArc((4.96380951243048, -5), FILLET8_R, 90, 85.12397513038704)
            Line((-0.01809524378475658, -4.574999999999999), (-0.5162857194062802, -4.532499999999999))
            ThreePointArc((-0.5162857194062802, -4.532499999999999), (-0.49999999999999645, -4.149999999999995), (-0.5, 0))
            Line((-0.5, 0), (0, 0.5))
            Line((0, 0.5), (4.96380951243048, 0.5))
            Line((4.96380951243048, 0.5), (4.96380951243048, 0))
        make_face()
    extrude(amount=41.910000000000004, mode=Mode.SUBTRACT)

    # Fillet10
    fillet10_edges = [part.edges().sort_by_distance(p)[0] for p in [
        (-20.060000000000006, -23.335, 29.200000000000003),
    ]]
    fillet(fillet10_edges, radius=FILLET10_R)

    # Fillet11
    fillet11_edges = [part.edges().sort_by_distance(p)[0] for p in [
        (-29.200000000000014, -23.335, 20.050000000000004),
    ]]
    fillet(fillet11_edges, radius=FILLET11_R)

    # Fillet12
    fillet12_edges = [part.edges().sort_by_distance(p)[0] for p in [
        (-29.2, -23.335, -20.049999999999997),
    ]]
    fillet(fillet12_edges, radius=FILLET12_R)

    # Fillet13
    fillet13_edges = [part.edges().sort_by_distance(p)[0] for p in [
        (-20.060000000000016, -23.335, -29.199999999999996),
    ]]
    fillet(fillet13_edges, radius=FILLET13_R)

    # Fillet14
    fillet14_edges = [part.edges().sort_by_distance(p)[0] for p in [
        (20.049999999999997, -23.335, -29.199999999999996),
    ]]
    fillet(fillet14_edges, radius=FILLET14_R)

    # Fillet15
    fillet15_edges = [part.edges().sort_by_distance(p)[0] for p in [
        (20.049999999999986, -23.335, 29.200000000000006),
    ]]
    fillet(fillet15_edges, radius=FILLET15_R)


solid = part.part
